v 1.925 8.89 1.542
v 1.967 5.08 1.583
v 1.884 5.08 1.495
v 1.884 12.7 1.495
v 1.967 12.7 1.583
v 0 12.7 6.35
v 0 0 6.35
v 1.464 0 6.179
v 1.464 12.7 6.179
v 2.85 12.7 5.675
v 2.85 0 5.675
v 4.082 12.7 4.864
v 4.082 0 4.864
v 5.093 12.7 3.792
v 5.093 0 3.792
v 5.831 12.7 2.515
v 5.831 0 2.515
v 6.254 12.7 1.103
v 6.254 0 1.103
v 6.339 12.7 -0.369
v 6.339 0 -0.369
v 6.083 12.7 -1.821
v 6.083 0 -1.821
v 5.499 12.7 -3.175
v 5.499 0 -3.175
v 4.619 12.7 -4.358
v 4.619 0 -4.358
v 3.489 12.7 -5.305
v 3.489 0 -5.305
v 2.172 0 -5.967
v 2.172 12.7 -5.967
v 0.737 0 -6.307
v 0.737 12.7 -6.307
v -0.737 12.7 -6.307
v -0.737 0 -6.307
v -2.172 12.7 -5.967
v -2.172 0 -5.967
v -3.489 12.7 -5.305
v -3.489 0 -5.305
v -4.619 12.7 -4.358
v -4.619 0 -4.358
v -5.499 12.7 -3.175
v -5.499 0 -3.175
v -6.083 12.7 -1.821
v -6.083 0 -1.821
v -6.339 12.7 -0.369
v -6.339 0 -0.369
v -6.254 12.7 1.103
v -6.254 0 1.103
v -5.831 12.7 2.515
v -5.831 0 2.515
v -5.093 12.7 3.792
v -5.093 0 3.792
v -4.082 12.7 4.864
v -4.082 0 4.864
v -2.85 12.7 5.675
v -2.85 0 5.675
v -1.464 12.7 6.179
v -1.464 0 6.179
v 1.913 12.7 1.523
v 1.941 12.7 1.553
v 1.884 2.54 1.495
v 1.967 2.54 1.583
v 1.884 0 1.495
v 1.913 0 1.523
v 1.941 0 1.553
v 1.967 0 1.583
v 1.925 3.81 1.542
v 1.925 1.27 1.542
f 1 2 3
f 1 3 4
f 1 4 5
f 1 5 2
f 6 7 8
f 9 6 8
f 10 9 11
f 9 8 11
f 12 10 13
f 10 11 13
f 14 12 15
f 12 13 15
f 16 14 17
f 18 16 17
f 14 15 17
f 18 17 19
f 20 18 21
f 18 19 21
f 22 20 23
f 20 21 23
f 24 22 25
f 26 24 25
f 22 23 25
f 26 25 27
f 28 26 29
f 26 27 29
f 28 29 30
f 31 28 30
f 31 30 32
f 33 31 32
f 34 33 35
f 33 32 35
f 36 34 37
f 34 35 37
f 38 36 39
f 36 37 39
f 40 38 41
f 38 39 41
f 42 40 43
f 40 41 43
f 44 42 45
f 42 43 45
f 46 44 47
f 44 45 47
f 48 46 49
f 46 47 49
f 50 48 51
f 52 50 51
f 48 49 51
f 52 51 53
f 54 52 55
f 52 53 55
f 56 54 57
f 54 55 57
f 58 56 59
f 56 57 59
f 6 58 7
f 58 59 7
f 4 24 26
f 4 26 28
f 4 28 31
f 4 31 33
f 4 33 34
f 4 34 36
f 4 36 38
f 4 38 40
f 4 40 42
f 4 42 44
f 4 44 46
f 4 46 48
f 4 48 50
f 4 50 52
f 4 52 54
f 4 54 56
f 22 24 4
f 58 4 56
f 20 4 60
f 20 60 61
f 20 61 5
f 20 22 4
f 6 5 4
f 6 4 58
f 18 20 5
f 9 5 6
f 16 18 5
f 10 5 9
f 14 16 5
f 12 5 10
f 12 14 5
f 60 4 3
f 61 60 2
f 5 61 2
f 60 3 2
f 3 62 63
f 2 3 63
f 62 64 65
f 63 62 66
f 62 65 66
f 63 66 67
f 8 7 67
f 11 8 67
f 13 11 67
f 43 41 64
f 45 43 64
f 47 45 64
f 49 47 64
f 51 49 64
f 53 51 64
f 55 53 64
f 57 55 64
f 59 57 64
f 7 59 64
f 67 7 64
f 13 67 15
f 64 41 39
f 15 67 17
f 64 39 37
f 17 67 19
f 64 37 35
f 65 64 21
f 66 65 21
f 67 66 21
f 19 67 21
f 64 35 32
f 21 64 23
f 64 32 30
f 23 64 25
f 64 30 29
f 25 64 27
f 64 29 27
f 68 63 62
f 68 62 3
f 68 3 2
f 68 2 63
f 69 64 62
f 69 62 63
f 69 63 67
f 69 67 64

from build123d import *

# Parameters (mm, degrees)
SKETCH2_R            = 6.35
SKETCH2_R_2          = 5.996524519
BOSS_EXTRUDE5_DEPTH  = 12.7
SKETCH2_5_R          = 5.996524519
BOSS_EXTRUDE6_DEPTH  = 2.54
BOSS_EXTRUDE7_DEPTH  = 3.81
BOSS_EXTRUDE8_DEPTH  = 5.08
BOSS_EXTRUDE9_DEPTH  = 6.35
SKETCH2_9_R          = 5.996524519
BOSS_EXTRUDE12_DEPTH = 12.7


with BuildPart() as part:
    # Sketch2 → Boss-Extrude5 (new body)
    with BuildSketch(Plane(origin=(0, 0, 0), x_dir=(1, 0, 0), z_dir=(0, 1, 0))):
        Circle(SKETCH2_R)
        Circle(SKETCH2_R_2, mode=Mode.SUBTRACT)
    extrude(amount=BOSS_EXTRUDE5_DEPTH)

    # Sketch2<5> → Boss-Extrude6 (add)
    with BuildSketch(Plane(origin=(0, 0, 0), x_dir=(1, 0, 0), z_dir=(0, 1, 0))):
        Circle(SKETCH2_5_R)
        with BuildLine():
            ThreePointArc((1.884352254, -1.495029686), (1.927203331, -1.537802313), (1.967424302, -1.583056993))
            add(Edge.make_bspline(
                [(1.884352254, -1.495029686), (1.924927612, -1.545625193), (1.967424302, -1.583056993)],
                knots=[2.708156781, 2.708156781, 2.708156781, 2.825642238, 2.825642238, 2.825642238], degree=2, weights=[1, 0.998275142, 1]))
        make_face(mode=Mode.SUBTRACT)
    extrude(amount=BOSS_EXTRUDE6_DEPTH)

    # Sketch2<6> → Boss-Extrude7 (add)
    with BuildSketch(Plane(origin=(0, 0, 0), x_dir=(1, 0, 0), z_dir=(0, 1, 0))):
        with BuildLine():
            Line((2.203644713, 2.412375149), (2.203644713, -1.684450362))
            add(Edge.make_bspline(
                [(2.203644713, -1.684450362), (2.963880375, -1.684450362), (2.963880375, 0.363962394), (2.963880375, 2.412375149), (2.203644713, 2.412375149)],
                knots=[3.141592654, 3.141592654, 3.141592654, 4.71238898, 4.71238898, 6.283185307, 6.283185307, 6.283185307], degree=2, weights=[1, 0.707106781, 1, 0.707106781, 1]))
        make_face()
    extrude(amount=BOSS_EXTRUDE7_DEPTH)

    # Sketch2<7> → Boss-Extrude8 (add)
    with BuildSketch(Plane(origin=(0, 0, 0), x_dir=(1, 0, 0), z_dir=(0, 1, 0))):
        with BuildLine():
            Line((0.175754582, -0.482779286), (0.175754582, -2.233509451))
            Line((0.175754582, -2.233509451), (0.176349615, -2.233509451))
            ThreePointArc((0.176349615, -2.233509451), (1.189997164, -3.247157), (2.203644713, -2.233509451))
            Line((2.203644713, -2.233509451), (2.203644713, -1.684450362))
            Line((2.203644713, -1.684450362), (2.203644713, 2.412375149))
            Line((2.203644713, 2.412375149), (2.203644713, 2.961434238))
            ThreePointArc((2.203644713, 2.961434238), (0.758944414, 5.025083358), (-1.674487689, 4.373765582))
            add(Edge.make_bspline(
                [(-2.181065395, 3.145924813), (-0.969249834, 3.082016488), (-0.735212375, 3.64927543), (-0.501174917, 4.216534371), (-1.674487689, 4.373765582)],
                knots=[1.460003031, 1.460003031, 1.460003031, 2.948448562, 2.948448562, 4.436894093, 4.436894093, 4.436894093], degree=2, weights=[1, 0.735614623, 1, 0.735614623, 1]))
            ThreePointArc((-2.181065395, 3.145924813), (-2.18688649, 3.053761144), (-2.188828, 2.961434238))
            Line((-2.188828, 2.961434238), (-2.188828, -2.233509451))
            ThreePointArc((-2.188828, -2.233509451), (-1.217415765, -3.204921686), (-0.24600353, -2.233509451))
            Line((-0.24600353, -2.233509451), (-0.24600353, -0.482779286))
            Line((-0.24600353, -0.482779286), (0.175754582, -0.482779286))
        make_face()
        with BuildLine():
            ThreePointArc((1.884352254, -1.495029686), (1.927203331, -1.537802313), (1.967424302, -1.583056993))
            add(Edge.make_bspline(
                [(1.884352254, -1.495029686), (1.924927612, -1.545625193), (1.967424302, -1.583056993)],
                knots=[2.708156781, 2.708156781, 2.708156781, 2.825642238, 2.825642238, 2.825642238], degree=2, weights=[1, 0.998275142, 1]))
        make_face(mode=Mode.SUBTRACT)
    extrude(amount=BOSS_EXTRUDE8_DEPTH)

    # Sketch2<8> → Boss-Extrude9 (add)
    with BuildSketch(Plane(origin=(0, 0, 0), x_dir=(1, 0, 0), z_dir=(0, 1, 0))):
        with BuildLine():
            add(Edge.make_bspline(
                [(-2.181065395, 3.145924813), (-0.969249834, 3.082016488), (-0.735212375, 3.64927543), (-0.501174917, 4.216534371), (-1.674487689, 4.373765582)],
                knots=[1.460003031, 1.460003031, 1.460003031, 2.948448562, 2.948448562, 4.436894093, 4.436894093, 4.436894093], degree=2, weights=[1, 0.735614623, 1, 0.735614623, 1]))
            add(Edge.make_bspline(
                [(-1.674487689, 4.373765582), (-3.358741472, 4.599466068), (-3.358741472, 3.769755627)],
                knots=[4.436894093, 4.436894093, 4.436894093, 6.283185307, 6.283185307, 6.283185307], degree=2, weights=[1, 0.603314513, 1]))
            add(Edge.make_bspline(
                [(-3.358741472, 3.769755627), (-3.358741472, 3.208032701), (-2.181065395, 3.145924813)],
                knots=[0, 0, 0, 1.460003031, 1.460003031, 1.460003031], degree=2, weights=[1, 0.745173392, 1]))
        make_face()
    extrude(amount=BOSS_EXTRUDE9_DEPTH)

    # Sketch2<9> → Boss-Extrude12 (add)
    with BuildSketch(Plane(origin=(0, 0, 0), x_dir=(1, 0, 0), z_dir=(0, 1, 0))):
        Circle(SKETCH2_9_R)
        with BuildLine():
            ThreePointArc((1.884352254, -1.495029686), (1.927203331, -1.537802313), (1.967424302, -1.583056993))
            add(Edge.make_bspline(
                [(1.884352254, -1.495029686), (1.924927612, -1.545625193), (1.967424302, -1.583056993)],
                knots=[2.708156781, 2.708156781, 2.708156781, 2.825642238, 2.825642238, 2.825642238], degree=2, weights=[1, 0.998275142, 1]))
        make_face(mode=Mode.SUBTRACT)
    extrude(amount=BOSS_EXTRUDE12_DEPTH)


solid = part.part
